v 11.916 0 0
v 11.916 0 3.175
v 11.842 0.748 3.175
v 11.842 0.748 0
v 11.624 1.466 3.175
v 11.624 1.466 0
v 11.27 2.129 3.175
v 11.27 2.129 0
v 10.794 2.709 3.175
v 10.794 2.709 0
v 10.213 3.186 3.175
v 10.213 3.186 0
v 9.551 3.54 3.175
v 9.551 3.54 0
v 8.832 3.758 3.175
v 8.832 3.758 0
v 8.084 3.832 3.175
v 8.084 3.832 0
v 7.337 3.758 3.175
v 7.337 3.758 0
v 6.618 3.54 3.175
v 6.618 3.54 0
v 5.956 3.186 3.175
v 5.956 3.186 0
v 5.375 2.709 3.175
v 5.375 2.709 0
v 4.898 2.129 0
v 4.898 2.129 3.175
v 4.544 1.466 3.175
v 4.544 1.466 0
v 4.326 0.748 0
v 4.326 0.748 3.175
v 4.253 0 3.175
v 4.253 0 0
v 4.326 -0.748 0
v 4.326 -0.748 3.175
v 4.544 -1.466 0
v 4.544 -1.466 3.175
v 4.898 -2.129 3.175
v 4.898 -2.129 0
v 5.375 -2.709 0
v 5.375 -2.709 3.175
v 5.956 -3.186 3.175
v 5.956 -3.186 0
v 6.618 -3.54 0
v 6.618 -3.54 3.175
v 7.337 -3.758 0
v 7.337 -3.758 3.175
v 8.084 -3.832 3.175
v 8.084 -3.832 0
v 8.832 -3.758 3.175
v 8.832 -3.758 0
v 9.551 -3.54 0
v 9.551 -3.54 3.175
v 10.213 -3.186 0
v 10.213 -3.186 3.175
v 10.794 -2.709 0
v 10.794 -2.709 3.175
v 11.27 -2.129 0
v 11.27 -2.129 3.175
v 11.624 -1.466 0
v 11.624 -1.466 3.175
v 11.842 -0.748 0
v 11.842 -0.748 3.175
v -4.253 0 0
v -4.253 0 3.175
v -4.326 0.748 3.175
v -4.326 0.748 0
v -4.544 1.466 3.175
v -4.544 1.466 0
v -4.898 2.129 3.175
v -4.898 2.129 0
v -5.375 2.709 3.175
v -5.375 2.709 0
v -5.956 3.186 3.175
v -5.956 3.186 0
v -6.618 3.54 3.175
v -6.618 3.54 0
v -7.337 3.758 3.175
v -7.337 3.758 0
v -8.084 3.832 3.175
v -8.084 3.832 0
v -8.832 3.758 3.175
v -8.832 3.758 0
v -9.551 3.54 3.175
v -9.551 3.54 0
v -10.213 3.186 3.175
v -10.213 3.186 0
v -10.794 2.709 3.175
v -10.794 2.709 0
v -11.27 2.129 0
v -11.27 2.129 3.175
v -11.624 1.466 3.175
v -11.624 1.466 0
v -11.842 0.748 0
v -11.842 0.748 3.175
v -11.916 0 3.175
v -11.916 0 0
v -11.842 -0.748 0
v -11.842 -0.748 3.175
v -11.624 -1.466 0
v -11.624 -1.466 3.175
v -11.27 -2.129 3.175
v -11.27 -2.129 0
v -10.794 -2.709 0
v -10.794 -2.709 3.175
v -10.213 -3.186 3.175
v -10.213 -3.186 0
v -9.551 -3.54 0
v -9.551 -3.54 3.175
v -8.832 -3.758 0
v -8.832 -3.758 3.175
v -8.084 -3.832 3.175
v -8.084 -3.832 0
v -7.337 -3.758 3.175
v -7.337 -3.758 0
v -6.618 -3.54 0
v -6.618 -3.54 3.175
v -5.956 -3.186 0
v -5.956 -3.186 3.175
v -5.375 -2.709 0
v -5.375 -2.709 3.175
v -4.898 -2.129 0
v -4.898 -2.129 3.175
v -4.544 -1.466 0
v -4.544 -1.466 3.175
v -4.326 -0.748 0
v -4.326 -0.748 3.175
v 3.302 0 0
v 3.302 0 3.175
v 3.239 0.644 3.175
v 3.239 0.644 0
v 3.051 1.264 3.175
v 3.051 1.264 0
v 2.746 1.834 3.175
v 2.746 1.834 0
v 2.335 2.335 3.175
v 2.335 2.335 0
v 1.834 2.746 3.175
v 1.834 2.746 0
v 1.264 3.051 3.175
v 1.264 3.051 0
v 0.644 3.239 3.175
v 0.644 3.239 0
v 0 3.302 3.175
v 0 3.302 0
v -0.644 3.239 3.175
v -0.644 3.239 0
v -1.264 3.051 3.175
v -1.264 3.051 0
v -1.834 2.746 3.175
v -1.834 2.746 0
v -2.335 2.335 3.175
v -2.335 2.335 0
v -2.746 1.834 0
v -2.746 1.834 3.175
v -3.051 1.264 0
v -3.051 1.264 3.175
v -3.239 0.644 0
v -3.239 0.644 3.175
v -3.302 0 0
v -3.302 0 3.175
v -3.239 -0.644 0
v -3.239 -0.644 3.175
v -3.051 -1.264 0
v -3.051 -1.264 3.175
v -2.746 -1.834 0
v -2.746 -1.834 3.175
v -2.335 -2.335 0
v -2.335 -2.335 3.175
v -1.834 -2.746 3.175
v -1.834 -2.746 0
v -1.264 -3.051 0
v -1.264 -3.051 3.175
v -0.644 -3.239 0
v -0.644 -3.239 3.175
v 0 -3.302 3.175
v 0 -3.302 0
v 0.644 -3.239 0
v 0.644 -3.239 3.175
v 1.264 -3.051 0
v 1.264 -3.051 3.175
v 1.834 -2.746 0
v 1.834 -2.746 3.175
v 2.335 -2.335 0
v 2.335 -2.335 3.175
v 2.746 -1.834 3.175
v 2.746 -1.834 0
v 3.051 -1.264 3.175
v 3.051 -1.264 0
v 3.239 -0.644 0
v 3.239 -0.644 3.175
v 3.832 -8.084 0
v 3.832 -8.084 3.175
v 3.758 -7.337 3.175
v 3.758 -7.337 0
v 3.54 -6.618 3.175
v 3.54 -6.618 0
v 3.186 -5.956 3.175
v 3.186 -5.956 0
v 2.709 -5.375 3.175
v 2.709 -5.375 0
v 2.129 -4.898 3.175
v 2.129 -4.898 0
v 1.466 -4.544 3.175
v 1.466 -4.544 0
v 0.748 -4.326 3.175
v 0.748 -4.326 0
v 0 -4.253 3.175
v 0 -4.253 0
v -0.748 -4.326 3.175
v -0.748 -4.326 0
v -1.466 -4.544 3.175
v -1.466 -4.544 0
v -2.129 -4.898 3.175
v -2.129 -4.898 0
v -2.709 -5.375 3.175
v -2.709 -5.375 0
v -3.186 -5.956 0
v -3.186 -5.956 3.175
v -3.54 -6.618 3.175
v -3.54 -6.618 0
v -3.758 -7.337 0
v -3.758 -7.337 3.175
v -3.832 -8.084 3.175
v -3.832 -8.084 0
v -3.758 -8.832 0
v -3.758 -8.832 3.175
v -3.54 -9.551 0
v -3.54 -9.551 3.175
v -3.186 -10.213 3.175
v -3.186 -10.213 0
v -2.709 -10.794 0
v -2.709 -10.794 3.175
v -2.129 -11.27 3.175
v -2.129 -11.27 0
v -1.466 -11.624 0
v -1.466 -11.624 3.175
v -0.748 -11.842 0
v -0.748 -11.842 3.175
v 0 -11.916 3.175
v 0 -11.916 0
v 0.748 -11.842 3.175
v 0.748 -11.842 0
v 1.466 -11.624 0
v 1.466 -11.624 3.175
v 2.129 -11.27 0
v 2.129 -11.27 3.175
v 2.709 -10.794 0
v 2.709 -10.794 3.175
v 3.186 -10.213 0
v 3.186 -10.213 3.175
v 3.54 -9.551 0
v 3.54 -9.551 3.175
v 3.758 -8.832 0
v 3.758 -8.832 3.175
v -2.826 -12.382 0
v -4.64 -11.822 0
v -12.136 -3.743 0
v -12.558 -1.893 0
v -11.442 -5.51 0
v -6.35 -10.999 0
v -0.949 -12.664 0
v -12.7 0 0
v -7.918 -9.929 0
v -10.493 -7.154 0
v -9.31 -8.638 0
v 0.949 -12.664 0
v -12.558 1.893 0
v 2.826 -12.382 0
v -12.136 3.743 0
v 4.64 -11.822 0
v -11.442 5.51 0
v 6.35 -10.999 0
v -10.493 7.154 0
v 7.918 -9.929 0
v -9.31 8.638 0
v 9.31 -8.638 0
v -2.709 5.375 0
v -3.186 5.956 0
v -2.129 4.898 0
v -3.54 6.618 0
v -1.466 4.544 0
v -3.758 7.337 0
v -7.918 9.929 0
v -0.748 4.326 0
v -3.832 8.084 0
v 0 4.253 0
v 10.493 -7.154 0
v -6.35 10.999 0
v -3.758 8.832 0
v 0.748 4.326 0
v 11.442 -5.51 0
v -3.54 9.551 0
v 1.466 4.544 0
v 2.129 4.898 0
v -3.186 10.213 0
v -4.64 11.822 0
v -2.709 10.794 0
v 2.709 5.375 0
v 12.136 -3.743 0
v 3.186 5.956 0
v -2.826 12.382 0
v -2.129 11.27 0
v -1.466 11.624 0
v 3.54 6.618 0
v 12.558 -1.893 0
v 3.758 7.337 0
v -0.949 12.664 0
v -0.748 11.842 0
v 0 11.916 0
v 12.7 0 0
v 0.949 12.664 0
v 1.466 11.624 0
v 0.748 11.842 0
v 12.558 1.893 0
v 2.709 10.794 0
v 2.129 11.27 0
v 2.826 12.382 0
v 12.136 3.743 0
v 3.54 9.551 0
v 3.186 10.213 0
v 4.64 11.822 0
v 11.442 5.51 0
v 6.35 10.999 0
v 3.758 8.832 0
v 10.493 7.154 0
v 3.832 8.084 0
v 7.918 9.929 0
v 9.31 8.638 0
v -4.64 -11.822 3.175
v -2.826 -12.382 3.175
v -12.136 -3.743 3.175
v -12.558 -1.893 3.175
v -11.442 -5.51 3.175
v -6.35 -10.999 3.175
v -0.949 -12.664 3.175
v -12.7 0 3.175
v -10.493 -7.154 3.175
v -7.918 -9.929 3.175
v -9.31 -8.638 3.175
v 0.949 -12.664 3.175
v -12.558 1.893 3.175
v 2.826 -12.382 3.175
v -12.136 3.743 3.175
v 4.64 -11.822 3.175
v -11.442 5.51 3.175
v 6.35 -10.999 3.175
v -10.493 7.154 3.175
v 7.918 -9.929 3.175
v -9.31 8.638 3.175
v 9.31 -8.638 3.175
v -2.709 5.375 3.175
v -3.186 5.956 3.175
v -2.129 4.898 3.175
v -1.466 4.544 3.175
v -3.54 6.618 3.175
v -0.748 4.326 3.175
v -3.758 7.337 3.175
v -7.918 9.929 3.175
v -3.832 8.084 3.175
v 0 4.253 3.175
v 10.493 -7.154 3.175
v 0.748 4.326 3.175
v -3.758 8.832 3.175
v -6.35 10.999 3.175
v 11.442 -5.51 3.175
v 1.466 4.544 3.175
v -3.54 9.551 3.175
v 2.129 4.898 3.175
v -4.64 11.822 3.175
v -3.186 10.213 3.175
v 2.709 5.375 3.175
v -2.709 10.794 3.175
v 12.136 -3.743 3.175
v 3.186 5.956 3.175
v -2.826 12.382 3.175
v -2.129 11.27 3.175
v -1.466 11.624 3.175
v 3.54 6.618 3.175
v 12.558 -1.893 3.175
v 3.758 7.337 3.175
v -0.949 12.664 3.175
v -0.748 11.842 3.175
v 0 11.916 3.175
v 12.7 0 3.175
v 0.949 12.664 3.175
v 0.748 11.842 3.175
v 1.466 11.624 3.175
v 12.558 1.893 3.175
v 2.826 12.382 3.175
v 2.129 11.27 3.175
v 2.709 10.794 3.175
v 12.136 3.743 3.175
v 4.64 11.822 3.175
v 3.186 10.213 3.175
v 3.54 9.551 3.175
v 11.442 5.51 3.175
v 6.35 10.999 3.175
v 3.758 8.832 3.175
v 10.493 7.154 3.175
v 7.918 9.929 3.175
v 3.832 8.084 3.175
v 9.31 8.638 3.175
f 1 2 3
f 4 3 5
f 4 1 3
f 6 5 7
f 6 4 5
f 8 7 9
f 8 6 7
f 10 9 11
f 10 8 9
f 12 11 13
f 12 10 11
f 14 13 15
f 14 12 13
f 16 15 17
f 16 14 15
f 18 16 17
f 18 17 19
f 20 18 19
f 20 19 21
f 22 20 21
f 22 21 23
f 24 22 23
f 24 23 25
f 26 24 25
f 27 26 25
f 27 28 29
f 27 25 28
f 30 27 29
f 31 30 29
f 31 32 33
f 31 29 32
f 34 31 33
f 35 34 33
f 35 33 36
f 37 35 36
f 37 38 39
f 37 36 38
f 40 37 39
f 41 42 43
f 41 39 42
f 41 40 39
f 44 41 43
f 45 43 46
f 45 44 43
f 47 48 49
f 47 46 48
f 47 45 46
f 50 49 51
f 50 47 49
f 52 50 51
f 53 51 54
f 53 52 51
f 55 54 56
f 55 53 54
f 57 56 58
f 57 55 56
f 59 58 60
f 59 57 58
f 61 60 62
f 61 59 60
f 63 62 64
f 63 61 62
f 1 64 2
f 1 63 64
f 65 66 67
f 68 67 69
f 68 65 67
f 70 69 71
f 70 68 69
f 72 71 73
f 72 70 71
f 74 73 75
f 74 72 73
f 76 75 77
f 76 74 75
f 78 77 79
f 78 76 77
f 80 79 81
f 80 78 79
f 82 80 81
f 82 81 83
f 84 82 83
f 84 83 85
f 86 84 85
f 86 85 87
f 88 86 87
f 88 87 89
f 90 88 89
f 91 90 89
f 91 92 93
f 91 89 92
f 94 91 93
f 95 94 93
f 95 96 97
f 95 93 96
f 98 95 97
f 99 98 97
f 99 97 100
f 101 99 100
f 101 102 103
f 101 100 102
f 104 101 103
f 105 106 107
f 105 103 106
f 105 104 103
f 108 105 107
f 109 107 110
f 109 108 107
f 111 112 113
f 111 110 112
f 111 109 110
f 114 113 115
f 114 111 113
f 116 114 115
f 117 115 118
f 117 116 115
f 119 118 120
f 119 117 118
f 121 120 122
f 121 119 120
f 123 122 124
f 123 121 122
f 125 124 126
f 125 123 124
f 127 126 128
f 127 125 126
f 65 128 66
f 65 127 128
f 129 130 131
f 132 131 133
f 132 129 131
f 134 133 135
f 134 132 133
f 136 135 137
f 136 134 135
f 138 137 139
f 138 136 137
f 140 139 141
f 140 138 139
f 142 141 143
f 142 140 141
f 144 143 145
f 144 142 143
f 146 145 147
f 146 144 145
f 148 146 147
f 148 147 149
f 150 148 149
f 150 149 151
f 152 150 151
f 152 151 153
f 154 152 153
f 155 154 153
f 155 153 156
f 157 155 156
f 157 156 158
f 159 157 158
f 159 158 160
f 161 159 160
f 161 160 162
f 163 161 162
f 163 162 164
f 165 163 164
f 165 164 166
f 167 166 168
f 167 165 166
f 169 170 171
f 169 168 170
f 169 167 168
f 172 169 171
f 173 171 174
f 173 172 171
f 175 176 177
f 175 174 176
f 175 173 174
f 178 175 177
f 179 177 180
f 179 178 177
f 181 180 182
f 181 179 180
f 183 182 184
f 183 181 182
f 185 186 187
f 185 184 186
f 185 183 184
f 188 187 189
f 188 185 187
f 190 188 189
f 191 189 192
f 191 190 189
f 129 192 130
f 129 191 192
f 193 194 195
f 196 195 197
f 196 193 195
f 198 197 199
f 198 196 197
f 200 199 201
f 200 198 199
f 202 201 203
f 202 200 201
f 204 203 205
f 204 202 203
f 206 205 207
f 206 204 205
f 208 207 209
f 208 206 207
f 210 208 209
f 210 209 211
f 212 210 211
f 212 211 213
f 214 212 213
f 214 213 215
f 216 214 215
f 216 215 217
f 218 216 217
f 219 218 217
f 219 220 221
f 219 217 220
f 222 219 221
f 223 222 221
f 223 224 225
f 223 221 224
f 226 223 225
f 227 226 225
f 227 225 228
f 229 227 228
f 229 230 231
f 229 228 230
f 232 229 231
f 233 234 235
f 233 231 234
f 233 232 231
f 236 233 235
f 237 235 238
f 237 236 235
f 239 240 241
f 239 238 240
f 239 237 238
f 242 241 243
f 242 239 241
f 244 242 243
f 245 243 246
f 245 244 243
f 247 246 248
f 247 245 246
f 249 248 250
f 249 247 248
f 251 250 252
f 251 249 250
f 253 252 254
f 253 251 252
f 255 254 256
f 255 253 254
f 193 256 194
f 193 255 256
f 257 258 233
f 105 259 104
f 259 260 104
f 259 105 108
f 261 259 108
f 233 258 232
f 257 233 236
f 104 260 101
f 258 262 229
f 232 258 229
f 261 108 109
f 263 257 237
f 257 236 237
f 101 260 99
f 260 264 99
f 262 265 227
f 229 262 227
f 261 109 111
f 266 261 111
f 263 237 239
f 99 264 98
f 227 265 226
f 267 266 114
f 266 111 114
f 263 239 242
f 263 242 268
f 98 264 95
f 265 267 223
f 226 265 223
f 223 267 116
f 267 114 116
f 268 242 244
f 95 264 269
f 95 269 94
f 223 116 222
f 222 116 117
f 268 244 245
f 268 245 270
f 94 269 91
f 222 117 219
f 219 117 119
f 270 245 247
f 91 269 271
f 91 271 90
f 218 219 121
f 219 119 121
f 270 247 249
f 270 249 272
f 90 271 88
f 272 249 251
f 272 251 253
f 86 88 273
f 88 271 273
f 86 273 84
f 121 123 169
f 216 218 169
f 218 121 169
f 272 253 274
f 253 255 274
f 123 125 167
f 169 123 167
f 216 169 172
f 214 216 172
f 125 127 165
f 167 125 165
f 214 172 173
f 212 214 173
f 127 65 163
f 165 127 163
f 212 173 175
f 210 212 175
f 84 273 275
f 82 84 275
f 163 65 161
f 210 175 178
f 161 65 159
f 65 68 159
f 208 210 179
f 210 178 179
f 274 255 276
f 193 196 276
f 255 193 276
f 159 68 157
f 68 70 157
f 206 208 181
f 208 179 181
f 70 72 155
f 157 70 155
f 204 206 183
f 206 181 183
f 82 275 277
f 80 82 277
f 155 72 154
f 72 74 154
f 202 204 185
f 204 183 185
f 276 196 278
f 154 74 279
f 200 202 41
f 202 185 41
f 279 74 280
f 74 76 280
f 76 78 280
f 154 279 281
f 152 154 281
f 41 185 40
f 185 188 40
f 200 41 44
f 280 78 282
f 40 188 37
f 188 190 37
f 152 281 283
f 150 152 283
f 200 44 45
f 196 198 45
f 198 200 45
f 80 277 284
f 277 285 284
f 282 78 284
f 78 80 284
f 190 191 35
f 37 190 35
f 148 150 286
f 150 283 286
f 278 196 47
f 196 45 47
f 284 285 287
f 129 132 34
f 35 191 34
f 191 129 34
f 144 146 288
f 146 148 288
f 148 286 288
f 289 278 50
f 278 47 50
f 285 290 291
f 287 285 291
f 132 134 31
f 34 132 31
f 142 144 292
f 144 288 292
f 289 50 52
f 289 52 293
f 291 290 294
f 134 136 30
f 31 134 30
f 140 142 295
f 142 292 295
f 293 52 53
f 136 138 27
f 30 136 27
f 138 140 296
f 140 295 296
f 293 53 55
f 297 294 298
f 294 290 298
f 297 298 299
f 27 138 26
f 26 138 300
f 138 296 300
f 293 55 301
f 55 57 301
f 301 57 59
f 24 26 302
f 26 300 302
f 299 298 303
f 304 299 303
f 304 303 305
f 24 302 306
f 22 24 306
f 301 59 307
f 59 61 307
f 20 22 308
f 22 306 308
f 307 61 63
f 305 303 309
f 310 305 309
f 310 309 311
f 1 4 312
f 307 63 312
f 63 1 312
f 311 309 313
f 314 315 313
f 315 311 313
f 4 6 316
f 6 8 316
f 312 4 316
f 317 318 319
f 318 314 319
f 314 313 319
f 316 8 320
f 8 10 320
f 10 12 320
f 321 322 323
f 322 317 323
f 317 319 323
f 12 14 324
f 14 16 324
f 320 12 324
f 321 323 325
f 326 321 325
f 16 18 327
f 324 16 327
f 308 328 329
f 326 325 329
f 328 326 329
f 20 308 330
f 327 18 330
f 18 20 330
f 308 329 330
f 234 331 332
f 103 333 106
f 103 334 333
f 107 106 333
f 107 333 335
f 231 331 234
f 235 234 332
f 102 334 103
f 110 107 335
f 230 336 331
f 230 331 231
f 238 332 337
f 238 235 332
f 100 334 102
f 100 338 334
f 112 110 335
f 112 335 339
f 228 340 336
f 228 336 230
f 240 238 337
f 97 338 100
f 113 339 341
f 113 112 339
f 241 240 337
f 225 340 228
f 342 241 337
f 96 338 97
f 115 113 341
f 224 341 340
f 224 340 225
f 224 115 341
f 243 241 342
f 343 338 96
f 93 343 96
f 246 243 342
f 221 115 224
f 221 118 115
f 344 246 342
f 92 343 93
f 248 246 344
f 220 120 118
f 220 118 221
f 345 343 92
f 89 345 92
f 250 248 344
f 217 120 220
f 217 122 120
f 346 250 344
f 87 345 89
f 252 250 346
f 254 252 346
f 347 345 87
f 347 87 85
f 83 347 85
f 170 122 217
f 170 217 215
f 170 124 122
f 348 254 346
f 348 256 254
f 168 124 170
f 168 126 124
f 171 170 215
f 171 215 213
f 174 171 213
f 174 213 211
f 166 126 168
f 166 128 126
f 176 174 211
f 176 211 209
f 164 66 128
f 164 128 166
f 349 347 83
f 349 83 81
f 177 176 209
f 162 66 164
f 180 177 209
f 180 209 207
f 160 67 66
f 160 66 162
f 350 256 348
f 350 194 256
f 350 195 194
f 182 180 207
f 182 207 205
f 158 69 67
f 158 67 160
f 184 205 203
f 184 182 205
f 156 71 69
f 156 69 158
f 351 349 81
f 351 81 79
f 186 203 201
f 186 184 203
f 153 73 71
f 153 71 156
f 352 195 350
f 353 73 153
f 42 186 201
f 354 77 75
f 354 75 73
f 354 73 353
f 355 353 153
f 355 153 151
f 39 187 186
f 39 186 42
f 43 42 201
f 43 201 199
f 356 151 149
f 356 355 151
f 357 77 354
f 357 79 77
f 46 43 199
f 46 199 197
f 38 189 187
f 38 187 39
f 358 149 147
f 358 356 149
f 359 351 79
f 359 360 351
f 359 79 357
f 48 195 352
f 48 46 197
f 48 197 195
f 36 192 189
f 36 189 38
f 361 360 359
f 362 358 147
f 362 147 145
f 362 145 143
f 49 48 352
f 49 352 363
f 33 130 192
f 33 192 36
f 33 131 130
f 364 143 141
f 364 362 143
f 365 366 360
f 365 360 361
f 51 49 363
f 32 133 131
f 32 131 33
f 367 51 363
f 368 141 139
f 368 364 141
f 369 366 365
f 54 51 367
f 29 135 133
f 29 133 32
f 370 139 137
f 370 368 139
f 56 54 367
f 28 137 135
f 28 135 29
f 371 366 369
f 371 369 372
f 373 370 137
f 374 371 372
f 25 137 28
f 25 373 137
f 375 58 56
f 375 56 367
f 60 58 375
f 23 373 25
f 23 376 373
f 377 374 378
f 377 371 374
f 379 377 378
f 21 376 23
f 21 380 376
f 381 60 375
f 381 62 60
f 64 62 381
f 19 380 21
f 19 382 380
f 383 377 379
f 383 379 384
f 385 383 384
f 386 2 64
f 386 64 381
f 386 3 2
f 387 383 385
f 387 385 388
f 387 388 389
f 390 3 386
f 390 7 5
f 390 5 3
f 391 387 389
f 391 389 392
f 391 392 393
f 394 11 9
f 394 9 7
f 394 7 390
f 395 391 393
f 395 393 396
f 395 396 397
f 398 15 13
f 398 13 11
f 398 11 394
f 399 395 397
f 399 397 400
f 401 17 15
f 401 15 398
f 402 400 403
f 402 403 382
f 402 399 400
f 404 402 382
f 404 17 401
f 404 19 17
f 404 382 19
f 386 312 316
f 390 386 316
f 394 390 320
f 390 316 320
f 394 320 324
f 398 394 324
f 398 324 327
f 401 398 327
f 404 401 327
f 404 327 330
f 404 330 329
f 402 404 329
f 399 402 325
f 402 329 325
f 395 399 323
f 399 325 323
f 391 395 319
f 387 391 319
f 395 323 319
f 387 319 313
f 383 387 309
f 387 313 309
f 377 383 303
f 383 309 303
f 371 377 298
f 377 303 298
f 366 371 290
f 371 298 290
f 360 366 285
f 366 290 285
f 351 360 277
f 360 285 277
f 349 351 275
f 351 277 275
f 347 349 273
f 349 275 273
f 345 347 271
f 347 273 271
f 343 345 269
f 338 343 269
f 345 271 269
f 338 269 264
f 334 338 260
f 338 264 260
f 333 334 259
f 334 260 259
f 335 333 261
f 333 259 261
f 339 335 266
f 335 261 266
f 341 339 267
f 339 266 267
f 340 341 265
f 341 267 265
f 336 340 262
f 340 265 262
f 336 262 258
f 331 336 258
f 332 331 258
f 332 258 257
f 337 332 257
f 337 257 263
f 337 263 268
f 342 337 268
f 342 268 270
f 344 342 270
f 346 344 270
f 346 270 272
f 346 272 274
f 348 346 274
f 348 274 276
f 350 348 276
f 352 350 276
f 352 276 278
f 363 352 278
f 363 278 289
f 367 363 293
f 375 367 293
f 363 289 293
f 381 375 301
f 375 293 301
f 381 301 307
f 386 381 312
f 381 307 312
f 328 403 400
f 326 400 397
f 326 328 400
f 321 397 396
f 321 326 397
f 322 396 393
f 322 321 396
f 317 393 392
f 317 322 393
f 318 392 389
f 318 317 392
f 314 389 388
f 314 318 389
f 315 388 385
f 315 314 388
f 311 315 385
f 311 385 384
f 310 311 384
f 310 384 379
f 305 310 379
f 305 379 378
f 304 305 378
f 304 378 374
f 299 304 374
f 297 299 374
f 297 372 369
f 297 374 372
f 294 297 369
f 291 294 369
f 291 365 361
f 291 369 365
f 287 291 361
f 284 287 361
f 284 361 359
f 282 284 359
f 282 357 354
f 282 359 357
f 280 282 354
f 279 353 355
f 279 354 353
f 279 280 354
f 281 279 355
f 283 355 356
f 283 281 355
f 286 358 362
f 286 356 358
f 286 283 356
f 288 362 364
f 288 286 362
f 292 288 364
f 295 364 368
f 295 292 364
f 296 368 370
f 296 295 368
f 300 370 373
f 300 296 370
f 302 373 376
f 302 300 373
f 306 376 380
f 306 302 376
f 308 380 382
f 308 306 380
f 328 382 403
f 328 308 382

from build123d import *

# Parameters (mm, degrees)
F0_R     = 12.7
F1_DEPTH = 3.175
F2_R     = 3.302
F3_DEPTH = 25.4
F4_R     = 3.831574
F5_DEPTH = 25.4


with BuildPart() as f1:
    # F0 (on Top) → F1 (new body)
    with BuildSketch(Plane.XY):
        Circle(F0_R)
    extrude(amount=F1_DEPTH)

    # F2 (on Top) → F3 (cut)
    with BuildSketch(Plane.XY):
        Circle(F2_R)
    extrude(amount=F3_DEPTH, mode=Mode.SUBTRACT)

    # F4 (on Top) → F5 (cut)
    with BuildSketch(Plane.XY):
        with Locations((0, 8.084333)):
            Circle(F4_R)
        with Locations((-8.084333, 0)):
            Circle(F4_R)
        with Locations((0, -8.084333)):
            Circle(F4_R)
        with Locations((8.084333, 0)):
            Circle(F4_R)
    extrude(amount=F5_DEPTH, mode=Mode.SUBTRACT)


solid = f1.part
